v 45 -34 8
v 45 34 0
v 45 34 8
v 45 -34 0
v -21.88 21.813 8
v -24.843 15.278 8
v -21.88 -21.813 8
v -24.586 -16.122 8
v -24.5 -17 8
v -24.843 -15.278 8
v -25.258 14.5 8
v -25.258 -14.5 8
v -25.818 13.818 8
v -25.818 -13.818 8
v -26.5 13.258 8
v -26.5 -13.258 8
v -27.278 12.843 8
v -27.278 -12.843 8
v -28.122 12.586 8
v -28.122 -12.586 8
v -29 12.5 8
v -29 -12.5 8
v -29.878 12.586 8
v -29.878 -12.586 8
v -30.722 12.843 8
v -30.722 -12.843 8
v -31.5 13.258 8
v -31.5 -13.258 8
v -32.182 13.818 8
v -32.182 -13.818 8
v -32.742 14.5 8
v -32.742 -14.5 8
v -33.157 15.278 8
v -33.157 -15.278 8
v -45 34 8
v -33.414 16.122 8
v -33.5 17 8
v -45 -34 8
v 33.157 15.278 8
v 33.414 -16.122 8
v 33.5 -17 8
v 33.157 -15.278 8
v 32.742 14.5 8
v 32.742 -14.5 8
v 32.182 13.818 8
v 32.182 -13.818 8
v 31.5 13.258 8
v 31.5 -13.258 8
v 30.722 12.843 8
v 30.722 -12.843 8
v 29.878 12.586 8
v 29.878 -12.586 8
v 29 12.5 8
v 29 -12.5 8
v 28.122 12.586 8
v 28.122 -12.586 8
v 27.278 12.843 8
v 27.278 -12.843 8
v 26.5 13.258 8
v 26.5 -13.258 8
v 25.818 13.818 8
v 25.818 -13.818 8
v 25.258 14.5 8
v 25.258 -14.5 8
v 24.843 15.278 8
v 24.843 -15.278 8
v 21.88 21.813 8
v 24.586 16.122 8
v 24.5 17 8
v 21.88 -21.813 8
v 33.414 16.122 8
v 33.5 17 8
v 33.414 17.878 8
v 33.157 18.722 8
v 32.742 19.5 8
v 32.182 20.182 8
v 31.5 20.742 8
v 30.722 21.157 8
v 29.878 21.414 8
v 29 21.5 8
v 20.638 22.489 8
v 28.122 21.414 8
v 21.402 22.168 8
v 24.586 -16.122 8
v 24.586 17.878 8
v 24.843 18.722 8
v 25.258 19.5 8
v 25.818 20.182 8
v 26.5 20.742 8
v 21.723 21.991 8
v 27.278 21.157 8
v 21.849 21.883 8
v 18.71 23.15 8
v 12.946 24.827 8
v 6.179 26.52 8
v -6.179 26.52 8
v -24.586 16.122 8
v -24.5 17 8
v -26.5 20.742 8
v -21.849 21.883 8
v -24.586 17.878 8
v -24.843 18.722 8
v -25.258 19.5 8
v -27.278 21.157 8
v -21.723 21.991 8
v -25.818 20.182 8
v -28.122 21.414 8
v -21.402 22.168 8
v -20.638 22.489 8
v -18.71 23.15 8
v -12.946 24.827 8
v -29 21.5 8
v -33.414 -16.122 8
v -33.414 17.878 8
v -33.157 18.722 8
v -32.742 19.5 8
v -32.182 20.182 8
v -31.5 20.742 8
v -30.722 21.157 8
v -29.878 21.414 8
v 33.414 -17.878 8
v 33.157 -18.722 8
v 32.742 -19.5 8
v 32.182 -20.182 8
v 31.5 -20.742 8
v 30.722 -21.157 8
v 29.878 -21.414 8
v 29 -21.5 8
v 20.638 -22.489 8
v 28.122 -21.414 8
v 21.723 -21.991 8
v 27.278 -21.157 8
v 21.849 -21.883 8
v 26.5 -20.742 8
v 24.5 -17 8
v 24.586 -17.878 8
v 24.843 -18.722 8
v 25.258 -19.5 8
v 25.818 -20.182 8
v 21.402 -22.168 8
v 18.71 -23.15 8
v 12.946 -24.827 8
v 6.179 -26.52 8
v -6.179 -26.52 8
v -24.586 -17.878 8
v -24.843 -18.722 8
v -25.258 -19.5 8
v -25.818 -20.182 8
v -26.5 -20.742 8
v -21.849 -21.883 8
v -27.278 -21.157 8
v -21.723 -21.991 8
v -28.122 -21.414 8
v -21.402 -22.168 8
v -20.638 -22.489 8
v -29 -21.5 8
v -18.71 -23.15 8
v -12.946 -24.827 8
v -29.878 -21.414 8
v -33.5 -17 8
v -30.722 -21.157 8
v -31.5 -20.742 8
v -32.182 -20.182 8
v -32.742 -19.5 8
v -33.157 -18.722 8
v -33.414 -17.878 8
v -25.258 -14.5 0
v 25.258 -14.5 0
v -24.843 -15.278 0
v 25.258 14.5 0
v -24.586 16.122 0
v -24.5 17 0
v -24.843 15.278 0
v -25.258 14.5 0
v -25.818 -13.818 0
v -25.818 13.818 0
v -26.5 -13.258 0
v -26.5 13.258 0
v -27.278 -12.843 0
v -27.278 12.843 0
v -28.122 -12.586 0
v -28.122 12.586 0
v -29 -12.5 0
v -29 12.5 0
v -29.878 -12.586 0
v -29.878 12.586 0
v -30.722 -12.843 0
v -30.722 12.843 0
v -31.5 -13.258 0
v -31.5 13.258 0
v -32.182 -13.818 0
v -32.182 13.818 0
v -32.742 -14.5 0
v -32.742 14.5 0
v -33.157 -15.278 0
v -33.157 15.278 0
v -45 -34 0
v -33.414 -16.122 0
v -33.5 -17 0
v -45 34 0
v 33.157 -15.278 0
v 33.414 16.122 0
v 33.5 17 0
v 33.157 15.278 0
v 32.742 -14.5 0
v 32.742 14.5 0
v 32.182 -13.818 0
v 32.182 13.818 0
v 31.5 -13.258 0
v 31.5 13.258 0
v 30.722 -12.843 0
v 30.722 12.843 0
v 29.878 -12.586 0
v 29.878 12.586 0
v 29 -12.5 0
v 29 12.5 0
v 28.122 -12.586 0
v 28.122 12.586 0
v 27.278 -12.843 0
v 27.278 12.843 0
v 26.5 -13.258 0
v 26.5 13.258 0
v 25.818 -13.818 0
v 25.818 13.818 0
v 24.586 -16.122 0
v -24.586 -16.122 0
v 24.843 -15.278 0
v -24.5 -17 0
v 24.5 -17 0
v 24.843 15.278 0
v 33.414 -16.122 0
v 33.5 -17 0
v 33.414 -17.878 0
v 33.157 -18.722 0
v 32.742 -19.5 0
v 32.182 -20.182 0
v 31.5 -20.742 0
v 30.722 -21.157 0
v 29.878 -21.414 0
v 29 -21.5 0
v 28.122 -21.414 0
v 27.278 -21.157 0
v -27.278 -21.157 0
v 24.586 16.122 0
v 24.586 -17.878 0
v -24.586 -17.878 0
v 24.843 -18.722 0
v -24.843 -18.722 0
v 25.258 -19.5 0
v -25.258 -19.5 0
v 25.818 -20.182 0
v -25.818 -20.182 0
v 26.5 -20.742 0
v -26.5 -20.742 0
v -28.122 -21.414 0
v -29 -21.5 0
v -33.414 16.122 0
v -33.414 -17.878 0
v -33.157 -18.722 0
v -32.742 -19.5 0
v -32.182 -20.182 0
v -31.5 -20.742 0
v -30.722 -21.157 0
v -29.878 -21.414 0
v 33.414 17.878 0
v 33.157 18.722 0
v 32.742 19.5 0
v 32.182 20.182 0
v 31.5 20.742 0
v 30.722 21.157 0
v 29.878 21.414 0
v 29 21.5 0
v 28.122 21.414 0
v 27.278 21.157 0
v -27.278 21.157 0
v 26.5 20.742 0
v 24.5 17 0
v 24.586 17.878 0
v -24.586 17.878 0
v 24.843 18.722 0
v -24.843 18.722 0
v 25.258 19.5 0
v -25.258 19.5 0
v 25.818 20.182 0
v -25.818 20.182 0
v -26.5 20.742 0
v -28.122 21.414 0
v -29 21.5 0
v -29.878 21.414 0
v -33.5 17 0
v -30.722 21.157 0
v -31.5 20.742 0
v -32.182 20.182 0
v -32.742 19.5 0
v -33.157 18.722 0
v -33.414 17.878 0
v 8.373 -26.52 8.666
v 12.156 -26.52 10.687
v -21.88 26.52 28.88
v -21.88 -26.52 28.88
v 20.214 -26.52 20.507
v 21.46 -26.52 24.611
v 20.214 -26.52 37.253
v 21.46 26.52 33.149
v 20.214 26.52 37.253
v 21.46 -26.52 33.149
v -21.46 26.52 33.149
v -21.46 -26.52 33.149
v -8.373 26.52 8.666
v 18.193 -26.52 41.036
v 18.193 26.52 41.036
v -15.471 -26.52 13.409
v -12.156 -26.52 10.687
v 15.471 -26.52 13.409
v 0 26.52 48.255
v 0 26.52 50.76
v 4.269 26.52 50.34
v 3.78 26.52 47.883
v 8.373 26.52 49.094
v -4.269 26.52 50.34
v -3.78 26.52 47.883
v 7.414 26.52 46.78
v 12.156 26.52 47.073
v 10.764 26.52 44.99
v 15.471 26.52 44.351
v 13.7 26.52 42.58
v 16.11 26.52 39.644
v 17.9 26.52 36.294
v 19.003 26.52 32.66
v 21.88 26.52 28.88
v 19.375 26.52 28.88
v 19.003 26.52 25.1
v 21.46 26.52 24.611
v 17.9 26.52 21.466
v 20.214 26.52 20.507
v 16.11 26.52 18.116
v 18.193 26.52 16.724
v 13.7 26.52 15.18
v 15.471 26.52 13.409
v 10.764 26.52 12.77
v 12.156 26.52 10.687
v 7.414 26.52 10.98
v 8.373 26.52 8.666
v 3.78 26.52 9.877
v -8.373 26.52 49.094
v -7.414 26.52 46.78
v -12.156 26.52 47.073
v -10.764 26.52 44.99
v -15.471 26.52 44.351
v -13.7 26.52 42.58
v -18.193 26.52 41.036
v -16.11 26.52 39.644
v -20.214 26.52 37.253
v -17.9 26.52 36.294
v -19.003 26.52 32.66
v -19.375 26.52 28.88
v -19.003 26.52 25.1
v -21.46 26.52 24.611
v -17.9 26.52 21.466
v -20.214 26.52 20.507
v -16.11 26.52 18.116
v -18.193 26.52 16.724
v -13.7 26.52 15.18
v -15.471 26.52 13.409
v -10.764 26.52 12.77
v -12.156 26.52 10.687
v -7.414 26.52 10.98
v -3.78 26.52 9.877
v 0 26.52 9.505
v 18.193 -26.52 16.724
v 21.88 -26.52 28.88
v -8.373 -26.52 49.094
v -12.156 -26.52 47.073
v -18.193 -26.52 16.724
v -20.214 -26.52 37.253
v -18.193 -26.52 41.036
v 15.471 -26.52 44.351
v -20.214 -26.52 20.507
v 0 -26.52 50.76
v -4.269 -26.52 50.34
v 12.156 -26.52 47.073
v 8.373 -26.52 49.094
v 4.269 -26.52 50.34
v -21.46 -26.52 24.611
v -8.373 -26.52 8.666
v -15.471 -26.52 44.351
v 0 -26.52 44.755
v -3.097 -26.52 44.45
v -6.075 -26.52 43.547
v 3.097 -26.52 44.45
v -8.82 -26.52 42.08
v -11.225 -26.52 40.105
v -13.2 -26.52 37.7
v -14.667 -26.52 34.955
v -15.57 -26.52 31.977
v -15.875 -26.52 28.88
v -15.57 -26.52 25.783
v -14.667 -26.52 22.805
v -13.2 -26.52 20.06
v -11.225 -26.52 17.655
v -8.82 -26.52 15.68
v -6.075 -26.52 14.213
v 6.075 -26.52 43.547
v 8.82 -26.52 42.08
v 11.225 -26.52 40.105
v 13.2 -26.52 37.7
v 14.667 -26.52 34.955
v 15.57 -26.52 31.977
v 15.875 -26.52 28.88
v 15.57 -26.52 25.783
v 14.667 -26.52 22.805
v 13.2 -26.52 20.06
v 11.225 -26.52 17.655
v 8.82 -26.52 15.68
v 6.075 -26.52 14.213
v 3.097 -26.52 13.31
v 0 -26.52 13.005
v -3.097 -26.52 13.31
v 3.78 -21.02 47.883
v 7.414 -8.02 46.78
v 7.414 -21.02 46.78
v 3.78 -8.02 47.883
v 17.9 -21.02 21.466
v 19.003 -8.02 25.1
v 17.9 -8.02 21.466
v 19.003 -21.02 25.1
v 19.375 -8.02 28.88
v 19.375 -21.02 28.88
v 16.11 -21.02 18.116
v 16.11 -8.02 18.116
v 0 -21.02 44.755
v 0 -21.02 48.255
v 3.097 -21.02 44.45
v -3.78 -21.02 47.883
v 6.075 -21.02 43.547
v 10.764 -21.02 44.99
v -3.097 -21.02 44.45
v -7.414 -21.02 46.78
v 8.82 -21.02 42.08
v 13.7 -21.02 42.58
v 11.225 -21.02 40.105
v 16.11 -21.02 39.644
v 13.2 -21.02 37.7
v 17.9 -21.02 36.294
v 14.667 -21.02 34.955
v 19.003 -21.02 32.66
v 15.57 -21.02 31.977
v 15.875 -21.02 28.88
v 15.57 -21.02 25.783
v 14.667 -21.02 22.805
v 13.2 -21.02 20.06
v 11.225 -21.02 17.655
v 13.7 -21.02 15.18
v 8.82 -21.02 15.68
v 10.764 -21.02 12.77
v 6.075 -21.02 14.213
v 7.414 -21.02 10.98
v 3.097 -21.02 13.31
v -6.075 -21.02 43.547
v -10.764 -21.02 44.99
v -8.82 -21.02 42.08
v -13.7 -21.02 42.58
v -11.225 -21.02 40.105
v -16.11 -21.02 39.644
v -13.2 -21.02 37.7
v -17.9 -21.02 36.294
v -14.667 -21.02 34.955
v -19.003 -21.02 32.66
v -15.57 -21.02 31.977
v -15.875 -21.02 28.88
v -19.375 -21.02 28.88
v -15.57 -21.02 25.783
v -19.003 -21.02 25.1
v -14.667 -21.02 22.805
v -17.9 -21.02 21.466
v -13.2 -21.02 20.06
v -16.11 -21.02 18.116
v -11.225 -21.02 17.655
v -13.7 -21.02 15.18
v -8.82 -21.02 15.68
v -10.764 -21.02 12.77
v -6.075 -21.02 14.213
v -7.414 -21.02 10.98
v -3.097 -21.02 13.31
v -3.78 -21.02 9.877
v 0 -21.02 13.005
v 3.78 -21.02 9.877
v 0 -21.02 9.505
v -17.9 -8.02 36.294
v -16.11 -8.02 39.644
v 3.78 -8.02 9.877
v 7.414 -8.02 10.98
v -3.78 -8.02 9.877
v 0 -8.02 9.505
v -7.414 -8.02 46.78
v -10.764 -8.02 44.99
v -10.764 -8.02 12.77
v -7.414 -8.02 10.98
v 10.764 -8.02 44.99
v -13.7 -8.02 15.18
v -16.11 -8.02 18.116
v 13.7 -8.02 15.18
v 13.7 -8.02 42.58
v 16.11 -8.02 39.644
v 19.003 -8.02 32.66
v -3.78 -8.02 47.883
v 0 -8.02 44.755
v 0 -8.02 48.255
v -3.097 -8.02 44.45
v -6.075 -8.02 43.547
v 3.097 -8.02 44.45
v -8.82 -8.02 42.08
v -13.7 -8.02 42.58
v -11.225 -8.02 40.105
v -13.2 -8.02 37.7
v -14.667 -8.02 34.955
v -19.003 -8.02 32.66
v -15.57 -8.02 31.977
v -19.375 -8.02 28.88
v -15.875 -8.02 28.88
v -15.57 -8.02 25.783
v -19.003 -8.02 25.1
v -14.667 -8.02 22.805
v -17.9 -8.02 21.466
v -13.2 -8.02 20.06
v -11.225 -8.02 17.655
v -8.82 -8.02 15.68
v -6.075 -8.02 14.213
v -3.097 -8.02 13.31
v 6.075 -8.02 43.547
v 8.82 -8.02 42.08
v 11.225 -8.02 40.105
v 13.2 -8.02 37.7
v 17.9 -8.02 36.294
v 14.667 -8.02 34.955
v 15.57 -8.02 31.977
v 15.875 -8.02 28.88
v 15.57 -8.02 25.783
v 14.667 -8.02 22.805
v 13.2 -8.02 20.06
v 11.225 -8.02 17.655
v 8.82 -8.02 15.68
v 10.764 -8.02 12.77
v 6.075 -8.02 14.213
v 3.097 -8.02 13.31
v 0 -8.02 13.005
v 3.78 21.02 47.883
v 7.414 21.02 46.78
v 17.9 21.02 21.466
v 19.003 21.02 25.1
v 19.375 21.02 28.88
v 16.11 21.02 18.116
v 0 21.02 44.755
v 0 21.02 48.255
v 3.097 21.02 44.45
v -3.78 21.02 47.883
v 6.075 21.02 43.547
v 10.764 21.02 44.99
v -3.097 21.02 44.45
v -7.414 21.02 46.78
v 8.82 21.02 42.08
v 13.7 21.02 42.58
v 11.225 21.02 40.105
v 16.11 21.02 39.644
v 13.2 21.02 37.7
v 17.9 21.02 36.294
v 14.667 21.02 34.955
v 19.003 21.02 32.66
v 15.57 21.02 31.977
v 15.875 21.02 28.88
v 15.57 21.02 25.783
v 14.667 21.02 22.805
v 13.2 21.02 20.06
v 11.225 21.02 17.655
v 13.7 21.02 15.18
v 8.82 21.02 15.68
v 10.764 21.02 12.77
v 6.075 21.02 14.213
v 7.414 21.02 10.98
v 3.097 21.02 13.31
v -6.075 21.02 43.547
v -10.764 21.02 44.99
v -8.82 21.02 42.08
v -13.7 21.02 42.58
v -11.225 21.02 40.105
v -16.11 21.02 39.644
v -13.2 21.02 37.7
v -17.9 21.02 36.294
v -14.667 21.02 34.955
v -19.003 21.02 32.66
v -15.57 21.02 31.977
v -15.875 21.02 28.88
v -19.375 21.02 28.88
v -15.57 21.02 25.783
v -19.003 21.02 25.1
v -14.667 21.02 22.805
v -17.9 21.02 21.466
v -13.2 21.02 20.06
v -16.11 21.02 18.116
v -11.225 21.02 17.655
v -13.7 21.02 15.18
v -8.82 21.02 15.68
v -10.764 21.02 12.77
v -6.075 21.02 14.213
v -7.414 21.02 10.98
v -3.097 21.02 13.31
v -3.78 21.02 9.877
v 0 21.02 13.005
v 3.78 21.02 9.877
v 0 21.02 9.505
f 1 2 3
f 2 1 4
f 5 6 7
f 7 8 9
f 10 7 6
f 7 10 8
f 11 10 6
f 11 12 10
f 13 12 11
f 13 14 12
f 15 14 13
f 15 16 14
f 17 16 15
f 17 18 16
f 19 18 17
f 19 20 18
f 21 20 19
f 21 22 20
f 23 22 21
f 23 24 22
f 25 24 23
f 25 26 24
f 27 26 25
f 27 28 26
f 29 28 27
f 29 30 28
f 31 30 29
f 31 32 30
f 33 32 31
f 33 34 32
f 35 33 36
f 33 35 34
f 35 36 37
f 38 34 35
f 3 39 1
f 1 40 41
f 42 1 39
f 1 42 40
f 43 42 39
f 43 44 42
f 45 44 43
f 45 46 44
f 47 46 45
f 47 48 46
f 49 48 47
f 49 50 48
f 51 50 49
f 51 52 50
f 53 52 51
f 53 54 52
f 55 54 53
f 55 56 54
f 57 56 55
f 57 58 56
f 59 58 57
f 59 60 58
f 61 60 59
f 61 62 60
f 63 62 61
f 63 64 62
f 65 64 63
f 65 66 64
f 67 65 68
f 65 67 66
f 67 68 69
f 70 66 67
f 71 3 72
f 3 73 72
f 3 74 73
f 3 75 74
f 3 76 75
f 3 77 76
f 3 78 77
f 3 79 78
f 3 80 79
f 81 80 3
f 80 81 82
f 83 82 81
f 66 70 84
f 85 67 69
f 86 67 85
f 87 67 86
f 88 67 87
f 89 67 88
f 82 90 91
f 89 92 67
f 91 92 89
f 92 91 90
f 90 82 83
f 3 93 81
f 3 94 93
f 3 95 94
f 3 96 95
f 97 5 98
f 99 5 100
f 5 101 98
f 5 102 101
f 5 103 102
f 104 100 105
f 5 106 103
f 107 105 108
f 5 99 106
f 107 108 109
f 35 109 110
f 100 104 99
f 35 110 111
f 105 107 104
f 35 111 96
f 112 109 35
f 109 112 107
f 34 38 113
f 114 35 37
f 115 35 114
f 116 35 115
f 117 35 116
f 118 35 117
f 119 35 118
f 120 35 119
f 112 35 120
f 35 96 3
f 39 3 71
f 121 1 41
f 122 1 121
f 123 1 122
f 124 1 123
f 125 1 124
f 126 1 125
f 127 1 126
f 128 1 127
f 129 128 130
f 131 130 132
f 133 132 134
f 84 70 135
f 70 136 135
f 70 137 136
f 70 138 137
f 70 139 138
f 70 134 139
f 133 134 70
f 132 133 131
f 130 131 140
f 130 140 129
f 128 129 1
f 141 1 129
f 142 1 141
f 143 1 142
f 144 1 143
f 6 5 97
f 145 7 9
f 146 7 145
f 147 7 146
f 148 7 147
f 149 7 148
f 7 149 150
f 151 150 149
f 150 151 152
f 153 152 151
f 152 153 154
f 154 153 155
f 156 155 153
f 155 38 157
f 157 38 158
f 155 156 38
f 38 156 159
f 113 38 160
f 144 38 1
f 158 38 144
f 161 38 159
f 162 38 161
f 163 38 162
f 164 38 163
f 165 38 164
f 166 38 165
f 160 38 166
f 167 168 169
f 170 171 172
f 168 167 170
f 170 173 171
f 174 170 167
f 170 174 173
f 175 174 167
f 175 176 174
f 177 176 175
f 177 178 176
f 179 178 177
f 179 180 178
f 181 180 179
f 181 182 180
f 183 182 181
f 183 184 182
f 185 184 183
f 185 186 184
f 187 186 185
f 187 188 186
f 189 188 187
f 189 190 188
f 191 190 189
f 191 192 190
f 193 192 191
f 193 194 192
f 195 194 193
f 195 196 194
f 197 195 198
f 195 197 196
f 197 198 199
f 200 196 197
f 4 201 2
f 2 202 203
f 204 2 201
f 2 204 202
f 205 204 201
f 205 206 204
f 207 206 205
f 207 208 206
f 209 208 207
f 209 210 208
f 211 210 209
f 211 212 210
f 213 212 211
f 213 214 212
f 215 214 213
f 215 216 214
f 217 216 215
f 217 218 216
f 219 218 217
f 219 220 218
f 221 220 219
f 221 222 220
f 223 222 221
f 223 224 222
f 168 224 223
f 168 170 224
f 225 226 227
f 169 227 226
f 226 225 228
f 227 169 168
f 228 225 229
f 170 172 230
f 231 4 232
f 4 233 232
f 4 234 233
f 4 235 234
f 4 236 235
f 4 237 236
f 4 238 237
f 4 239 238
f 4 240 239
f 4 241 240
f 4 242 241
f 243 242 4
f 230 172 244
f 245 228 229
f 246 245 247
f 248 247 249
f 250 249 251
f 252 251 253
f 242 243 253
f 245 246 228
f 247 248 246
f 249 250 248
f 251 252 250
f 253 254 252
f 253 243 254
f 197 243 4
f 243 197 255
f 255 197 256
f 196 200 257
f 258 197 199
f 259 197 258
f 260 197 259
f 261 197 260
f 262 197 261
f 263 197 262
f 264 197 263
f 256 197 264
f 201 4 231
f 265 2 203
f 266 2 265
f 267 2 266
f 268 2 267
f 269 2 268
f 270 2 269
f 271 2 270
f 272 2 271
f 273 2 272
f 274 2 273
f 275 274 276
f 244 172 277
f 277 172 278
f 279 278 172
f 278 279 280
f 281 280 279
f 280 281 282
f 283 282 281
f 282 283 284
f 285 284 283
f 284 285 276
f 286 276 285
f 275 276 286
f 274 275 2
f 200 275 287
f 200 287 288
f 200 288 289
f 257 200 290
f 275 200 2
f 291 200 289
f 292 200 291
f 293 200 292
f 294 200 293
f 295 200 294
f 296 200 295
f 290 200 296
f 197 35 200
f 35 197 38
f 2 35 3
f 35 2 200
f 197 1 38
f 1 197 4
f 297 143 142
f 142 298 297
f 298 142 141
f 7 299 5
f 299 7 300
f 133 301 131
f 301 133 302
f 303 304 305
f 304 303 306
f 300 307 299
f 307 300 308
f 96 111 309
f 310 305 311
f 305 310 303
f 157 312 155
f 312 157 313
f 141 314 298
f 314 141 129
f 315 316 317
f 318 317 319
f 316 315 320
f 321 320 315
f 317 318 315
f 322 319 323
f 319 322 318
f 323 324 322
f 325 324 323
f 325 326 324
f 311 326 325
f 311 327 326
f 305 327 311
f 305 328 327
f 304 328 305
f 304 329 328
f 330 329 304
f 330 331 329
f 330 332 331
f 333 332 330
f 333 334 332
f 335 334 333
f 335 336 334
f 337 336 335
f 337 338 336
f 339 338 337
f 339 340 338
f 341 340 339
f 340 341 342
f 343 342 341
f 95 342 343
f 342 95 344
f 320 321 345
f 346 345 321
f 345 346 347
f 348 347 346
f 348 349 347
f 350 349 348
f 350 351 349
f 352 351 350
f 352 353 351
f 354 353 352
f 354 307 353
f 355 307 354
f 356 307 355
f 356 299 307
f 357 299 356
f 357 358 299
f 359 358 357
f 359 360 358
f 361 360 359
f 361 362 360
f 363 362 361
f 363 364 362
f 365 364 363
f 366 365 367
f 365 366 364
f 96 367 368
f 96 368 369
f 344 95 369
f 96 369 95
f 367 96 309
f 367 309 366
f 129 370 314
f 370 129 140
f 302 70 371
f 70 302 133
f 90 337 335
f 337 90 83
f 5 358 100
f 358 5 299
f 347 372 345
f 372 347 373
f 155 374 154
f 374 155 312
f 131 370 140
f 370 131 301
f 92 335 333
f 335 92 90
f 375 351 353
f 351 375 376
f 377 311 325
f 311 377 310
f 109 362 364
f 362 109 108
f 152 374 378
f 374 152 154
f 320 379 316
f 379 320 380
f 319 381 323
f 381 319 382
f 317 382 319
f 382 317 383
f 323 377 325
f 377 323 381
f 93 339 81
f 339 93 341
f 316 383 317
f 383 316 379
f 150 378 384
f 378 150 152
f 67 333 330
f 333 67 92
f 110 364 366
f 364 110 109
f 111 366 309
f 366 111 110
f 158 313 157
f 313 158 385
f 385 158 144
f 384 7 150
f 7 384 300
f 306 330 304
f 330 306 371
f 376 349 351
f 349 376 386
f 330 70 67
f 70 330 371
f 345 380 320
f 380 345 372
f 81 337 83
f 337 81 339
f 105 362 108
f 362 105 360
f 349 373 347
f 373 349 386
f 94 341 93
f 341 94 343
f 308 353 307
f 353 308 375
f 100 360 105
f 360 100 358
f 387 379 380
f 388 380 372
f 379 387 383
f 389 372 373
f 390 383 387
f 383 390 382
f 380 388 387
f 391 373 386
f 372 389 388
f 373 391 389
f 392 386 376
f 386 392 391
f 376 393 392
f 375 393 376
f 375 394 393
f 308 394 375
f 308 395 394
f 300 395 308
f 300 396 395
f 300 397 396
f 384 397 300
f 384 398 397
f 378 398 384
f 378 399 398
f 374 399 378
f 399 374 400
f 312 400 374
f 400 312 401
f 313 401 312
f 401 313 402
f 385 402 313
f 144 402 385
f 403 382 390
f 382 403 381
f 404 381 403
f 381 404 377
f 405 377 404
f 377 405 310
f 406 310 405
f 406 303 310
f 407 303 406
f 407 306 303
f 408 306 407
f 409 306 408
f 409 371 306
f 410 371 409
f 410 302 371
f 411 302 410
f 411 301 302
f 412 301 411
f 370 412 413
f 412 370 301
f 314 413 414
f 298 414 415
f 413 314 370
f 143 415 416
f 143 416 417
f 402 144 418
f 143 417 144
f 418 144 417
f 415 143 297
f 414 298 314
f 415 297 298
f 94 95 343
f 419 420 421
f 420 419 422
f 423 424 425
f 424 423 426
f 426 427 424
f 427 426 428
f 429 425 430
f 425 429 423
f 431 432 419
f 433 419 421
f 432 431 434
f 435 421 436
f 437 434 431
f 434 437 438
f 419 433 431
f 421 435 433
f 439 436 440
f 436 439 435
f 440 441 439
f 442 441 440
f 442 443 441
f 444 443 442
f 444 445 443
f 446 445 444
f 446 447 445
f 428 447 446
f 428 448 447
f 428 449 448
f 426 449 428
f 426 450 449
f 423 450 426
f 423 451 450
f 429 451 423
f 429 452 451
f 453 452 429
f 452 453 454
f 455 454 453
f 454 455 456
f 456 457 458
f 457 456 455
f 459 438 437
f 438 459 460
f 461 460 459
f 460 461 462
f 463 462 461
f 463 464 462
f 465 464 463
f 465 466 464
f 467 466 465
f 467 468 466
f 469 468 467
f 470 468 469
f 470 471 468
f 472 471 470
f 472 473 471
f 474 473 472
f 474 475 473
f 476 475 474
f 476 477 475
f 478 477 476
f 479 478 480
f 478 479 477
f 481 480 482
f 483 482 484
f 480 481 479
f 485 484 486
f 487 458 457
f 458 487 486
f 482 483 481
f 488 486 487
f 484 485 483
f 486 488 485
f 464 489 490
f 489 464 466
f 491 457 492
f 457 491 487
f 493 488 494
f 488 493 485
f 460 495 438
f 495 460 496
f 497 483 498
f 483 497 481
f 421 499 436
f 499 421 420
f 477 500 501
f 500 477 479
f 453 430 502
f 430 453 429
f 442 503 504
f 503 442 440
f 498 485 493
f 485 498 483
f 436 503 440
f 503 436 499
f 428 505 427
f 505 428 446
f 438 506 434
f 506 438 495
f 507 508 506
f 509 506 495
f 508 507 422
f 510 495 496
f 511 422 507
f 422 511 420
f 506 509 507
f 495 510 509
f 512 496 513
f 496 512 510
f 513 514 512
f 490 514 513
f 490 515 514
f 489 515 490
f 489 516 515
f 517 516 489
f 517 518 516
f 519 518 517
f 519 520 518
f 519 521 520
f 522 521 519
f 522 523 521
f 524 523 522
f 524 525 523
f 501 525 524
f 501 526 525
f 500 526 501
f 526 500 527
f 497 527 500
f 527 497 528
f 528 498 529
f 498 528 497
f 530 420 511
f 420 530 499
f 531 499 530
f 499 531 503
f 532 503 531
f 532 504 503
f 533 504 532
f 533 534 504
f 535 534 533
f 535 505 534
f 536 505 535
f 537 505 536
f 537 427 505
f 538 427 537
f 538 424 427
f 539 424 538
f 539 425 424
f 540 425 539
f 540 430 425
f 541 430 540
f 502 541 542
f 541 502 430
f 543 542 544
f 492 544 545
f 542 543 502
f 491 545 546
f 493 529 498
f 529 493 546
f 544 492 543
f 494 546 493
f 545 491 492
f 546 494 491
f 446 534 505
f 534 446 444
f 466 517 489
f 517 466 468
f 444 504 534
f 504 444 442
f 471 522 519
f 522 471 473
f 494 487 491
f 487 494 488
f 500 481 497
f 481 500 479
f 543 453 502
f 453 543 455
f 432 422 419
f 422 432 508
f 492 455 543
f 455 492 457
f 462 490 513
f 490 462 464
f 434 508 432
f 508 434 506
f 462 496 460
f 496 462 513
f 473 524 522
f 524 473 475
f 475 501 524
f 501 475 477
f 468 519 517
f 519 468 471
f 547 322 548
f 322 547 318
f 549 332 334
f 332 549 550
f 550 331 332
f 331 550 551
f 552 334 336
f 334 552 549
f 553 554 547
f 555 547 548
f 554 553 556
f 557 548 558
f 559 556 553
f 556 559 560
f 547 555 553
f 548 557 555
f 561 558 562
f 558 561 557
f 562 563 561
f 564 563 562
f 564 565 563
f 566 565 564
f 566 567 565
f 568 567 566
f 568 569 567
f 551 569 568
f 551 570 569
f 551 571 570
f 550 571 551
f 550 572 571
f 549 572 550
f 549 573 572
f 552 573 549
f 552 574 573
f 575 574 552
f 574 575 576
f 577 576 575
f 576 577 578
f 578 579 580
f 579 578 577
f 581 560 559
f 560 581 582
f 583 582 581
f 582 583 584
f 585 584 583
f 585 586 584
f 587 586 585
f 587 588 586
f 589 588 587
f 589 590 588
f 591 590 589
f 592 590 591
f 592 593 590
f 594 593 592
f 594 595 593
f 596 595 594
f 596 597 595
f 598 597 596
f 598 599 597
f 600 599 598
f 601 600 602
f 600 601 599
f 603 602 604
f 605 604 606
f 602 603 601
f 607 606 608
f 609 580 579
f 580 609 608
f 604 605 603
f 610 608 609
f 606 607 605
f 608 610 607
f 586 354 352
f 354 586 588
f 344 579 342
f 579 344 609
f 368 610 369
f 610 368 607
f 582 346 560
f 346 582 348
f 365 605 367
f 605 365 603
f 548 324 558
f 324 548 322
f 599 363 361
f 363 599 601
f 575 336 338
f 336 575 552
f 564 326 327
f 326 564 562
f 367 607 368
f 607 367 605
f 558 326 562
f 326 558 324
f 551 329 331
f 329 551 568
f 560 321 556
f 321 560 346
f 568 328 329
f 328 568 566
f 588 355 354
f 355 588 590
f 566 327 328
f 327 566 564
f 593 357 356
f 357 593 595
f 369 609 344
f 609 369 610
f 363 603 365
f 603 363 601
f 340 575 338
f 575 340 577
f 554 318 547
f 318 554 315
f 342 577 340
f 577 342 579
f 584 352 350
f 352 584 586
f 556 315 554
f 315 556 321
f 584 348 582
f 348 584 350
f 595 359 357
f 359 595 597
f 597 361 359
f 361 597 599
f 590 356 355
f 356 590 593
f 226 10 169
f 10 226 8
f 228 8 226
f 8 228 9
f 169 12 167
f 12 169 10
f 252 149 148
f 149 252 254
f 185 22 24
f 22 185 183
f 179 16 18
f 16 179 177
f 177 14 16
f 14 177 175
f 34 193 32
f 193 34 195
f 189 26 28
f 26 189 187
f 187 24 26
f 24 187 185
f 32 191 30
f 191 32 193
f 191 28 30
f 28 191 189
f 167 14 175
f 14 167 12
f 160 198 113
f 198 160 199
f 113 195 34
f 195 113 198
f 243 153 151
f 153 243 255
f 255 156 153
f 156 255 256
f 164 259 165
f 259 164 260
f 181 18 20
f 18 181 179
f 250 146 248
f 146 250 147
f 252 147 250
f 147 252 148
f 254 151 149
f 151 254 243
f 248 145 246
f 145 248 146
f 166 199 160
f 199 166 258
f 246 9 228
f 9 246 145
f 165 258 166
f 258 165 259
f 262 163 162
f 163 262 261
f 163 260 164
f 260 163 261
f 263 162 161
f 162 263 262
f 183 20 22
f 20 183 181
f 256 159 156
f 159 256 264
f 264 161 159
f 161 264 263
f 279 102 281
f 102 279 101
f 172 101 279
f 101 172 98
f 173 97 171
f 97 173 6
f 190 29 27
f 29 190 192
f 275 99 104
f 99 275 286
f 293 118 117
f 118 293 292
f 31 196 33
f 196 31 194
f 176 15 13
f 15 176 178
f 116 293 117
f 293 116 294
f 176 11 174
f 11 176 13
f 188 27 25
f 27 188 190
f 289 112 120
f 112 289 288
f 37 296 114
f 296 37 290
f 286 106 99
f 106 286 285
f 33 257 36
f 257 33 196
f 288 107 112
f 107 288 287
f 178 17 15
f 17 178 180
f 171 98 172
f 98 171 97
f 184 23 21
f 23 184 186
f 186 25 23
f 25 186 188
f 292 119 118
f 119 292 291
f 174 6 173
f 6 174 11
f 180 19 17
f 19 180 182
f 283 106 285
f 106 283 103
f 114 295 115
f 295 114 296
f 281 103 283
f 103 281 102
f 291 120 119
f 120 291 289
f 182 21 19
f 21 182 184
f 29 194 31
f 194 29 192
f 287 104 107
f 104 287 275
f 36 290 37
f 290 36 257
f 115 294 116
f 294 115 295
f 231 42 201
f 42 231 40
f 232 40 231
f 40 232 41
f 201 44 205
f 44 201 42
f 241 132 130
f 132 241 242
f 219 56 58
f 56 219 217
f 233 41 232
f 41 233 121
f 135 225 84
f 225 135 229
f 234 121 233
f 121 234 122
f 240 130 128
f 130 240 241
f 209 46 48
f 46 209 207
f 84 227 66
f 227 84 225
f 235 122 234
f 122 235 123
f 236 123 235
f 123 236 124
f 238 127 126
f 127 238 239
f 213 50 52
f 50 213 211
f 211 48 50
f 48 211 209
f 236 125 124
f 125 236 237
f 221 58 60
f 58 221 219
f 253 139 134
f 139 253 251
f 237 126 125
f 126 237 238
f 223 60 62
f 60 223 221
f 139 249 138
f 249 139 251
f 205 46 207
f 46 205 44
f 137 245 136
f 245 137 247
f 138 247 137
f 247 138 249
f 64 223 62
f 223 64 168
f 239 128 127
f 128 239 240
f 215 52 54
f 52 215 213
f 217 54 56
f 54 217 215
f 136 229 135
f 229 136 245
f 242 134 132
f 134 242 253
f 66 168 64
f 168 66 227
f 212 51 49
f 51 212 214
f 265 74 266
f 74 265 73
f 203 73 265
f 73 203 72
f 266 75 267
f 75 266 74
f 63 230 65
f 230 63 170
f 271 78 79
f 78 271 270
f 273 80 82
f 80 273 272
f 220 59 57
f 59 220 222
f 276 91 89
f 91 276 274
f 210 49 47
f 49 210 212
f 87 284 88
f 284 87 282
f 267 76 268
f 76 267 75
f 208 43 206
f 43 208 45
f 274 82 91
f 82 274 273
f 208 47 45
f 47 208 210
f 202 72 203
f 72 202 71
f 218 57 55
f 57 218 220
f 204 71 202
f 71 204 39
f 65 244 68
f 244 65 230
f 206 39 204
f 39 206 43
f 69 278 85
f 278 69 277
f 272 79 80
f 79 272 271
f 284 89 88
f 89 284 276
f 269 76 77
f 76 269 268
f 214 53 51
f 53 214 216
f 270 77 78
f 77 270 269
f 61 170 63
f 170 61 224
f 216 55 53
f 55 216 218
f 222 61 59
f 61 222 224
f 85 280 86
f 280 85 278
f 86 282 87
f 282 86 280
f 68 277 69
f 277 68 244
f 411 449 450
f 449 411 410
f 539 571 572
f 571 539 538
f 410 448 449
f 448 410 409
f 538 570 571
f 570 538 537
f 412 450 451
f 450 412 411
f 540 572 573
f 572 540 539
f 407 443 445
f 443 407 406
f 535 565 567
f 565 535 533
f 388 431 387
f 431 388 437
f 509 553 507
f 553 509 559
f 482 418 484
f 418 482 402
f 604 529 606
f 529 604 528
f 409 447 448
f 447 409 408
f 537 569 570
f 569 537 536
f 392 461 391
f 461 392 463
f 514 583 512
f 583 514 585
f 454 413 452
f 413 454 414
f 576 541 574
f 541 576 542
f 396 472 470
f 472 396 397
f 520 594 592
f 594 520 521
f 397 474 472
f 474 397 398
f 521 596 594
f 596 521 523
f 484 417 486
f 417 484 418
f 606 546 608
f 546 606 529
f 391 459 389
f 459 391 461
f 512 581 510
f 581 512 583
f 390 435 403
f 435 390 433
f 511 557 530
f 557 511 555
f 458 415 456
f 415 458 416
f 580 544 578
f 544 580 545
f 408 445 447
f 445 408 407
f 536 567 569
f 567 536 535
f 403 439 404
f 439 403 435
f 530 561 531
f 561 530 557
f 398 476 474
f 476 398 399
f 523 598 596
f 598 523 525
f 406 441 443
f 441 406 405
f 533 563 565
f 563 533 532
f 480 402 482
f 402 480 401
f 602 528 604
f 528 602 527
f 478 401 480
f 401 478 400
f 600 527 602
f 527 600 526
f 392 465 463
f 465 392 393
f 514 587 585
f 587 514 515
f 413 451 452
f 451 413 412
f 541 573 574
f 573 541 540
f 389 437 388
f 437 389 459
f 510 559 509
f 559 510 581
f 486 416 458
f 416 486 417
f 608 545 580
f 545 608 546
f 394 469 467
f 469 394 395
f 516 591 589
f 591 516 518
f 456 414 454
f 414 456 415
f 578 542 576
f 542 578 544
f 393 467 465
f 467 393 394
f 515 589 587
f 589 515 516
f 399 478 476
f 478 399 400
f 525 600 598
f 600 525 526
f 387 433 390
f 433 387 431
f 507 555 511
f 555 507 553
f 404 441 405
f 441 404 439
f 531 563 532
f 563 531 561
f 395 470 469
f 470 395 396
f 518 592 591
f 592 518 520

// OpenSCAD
$fn = 32;

// ----------------------------------------------------------------------
// Bearing block: 90 x 68 mm base, 31.75 mm bore at 28.88 mm
// ----------------------------------------------------------------------

// --- parameters (mm) ---
base_w = 90;              // base width
base_d = 68;              // base depth
base_t = 8;               // base thickness
bore_d = 31.75;           // shaft / bearing bore
house_r = 21.88;          // housing outer radius
house_len = 53.04;        // housing length along the shaft
foot_w = 43.76;           // foot width under the housing
foot_len = 43.04;         // foot length along the shaft
axis_z = 28.88;           // bore axis height above the base
holes_d = 9;              // mounting holes
hole_x = 29;              // mounting hole spacing
seat_d = 8;               // bearing seat depth
seat_wall = 3.5;          // seat wall thickness

difference() {
  union() {
    /* base plate with its underside on z = 0 */
    translate([0, 0, base_t / 2]) cube([base_w, base_d, base_t], center = true);
    /* hull foot: a straight web blending into the round housing */
    hull() {
      translate([0, 0, base_t - 0.5]) cube([foot_w, foot_len, 1.6], center = true);
      translate([0, 0, axis_z]) rotate([-90, 0, 0]) cylinder(h = house_len, d = 2 * house_r, center = true);
    }
  }
  /* bore through the housing, 2.5 mm clear on both sides */
  translate([0, 0, axis_z]) rotate([-90, 0, 0]) cylinder(h = house_len + 5, d = bore_d, center = true);
  /* bearing seats, recessed into both ends of the housing */
  for (sy = [-1, 1]) {
    translate([0, sy * (house_len / 2 - seat_d + 2.5), axis_z]) rotate([-90, 0, 0]) cylinder(h = seat_d + 5, d = bore_d + 2 * seat_wall);
  }
  /* mounting holes through the base plate */
  for (hx = [-29, 29]) {
    for (hy = [-17, 17]) {
      translate([hx, hy, -2.5]) cylinder(h = base_t + 5, d = holes_d);
    }
  }
}
